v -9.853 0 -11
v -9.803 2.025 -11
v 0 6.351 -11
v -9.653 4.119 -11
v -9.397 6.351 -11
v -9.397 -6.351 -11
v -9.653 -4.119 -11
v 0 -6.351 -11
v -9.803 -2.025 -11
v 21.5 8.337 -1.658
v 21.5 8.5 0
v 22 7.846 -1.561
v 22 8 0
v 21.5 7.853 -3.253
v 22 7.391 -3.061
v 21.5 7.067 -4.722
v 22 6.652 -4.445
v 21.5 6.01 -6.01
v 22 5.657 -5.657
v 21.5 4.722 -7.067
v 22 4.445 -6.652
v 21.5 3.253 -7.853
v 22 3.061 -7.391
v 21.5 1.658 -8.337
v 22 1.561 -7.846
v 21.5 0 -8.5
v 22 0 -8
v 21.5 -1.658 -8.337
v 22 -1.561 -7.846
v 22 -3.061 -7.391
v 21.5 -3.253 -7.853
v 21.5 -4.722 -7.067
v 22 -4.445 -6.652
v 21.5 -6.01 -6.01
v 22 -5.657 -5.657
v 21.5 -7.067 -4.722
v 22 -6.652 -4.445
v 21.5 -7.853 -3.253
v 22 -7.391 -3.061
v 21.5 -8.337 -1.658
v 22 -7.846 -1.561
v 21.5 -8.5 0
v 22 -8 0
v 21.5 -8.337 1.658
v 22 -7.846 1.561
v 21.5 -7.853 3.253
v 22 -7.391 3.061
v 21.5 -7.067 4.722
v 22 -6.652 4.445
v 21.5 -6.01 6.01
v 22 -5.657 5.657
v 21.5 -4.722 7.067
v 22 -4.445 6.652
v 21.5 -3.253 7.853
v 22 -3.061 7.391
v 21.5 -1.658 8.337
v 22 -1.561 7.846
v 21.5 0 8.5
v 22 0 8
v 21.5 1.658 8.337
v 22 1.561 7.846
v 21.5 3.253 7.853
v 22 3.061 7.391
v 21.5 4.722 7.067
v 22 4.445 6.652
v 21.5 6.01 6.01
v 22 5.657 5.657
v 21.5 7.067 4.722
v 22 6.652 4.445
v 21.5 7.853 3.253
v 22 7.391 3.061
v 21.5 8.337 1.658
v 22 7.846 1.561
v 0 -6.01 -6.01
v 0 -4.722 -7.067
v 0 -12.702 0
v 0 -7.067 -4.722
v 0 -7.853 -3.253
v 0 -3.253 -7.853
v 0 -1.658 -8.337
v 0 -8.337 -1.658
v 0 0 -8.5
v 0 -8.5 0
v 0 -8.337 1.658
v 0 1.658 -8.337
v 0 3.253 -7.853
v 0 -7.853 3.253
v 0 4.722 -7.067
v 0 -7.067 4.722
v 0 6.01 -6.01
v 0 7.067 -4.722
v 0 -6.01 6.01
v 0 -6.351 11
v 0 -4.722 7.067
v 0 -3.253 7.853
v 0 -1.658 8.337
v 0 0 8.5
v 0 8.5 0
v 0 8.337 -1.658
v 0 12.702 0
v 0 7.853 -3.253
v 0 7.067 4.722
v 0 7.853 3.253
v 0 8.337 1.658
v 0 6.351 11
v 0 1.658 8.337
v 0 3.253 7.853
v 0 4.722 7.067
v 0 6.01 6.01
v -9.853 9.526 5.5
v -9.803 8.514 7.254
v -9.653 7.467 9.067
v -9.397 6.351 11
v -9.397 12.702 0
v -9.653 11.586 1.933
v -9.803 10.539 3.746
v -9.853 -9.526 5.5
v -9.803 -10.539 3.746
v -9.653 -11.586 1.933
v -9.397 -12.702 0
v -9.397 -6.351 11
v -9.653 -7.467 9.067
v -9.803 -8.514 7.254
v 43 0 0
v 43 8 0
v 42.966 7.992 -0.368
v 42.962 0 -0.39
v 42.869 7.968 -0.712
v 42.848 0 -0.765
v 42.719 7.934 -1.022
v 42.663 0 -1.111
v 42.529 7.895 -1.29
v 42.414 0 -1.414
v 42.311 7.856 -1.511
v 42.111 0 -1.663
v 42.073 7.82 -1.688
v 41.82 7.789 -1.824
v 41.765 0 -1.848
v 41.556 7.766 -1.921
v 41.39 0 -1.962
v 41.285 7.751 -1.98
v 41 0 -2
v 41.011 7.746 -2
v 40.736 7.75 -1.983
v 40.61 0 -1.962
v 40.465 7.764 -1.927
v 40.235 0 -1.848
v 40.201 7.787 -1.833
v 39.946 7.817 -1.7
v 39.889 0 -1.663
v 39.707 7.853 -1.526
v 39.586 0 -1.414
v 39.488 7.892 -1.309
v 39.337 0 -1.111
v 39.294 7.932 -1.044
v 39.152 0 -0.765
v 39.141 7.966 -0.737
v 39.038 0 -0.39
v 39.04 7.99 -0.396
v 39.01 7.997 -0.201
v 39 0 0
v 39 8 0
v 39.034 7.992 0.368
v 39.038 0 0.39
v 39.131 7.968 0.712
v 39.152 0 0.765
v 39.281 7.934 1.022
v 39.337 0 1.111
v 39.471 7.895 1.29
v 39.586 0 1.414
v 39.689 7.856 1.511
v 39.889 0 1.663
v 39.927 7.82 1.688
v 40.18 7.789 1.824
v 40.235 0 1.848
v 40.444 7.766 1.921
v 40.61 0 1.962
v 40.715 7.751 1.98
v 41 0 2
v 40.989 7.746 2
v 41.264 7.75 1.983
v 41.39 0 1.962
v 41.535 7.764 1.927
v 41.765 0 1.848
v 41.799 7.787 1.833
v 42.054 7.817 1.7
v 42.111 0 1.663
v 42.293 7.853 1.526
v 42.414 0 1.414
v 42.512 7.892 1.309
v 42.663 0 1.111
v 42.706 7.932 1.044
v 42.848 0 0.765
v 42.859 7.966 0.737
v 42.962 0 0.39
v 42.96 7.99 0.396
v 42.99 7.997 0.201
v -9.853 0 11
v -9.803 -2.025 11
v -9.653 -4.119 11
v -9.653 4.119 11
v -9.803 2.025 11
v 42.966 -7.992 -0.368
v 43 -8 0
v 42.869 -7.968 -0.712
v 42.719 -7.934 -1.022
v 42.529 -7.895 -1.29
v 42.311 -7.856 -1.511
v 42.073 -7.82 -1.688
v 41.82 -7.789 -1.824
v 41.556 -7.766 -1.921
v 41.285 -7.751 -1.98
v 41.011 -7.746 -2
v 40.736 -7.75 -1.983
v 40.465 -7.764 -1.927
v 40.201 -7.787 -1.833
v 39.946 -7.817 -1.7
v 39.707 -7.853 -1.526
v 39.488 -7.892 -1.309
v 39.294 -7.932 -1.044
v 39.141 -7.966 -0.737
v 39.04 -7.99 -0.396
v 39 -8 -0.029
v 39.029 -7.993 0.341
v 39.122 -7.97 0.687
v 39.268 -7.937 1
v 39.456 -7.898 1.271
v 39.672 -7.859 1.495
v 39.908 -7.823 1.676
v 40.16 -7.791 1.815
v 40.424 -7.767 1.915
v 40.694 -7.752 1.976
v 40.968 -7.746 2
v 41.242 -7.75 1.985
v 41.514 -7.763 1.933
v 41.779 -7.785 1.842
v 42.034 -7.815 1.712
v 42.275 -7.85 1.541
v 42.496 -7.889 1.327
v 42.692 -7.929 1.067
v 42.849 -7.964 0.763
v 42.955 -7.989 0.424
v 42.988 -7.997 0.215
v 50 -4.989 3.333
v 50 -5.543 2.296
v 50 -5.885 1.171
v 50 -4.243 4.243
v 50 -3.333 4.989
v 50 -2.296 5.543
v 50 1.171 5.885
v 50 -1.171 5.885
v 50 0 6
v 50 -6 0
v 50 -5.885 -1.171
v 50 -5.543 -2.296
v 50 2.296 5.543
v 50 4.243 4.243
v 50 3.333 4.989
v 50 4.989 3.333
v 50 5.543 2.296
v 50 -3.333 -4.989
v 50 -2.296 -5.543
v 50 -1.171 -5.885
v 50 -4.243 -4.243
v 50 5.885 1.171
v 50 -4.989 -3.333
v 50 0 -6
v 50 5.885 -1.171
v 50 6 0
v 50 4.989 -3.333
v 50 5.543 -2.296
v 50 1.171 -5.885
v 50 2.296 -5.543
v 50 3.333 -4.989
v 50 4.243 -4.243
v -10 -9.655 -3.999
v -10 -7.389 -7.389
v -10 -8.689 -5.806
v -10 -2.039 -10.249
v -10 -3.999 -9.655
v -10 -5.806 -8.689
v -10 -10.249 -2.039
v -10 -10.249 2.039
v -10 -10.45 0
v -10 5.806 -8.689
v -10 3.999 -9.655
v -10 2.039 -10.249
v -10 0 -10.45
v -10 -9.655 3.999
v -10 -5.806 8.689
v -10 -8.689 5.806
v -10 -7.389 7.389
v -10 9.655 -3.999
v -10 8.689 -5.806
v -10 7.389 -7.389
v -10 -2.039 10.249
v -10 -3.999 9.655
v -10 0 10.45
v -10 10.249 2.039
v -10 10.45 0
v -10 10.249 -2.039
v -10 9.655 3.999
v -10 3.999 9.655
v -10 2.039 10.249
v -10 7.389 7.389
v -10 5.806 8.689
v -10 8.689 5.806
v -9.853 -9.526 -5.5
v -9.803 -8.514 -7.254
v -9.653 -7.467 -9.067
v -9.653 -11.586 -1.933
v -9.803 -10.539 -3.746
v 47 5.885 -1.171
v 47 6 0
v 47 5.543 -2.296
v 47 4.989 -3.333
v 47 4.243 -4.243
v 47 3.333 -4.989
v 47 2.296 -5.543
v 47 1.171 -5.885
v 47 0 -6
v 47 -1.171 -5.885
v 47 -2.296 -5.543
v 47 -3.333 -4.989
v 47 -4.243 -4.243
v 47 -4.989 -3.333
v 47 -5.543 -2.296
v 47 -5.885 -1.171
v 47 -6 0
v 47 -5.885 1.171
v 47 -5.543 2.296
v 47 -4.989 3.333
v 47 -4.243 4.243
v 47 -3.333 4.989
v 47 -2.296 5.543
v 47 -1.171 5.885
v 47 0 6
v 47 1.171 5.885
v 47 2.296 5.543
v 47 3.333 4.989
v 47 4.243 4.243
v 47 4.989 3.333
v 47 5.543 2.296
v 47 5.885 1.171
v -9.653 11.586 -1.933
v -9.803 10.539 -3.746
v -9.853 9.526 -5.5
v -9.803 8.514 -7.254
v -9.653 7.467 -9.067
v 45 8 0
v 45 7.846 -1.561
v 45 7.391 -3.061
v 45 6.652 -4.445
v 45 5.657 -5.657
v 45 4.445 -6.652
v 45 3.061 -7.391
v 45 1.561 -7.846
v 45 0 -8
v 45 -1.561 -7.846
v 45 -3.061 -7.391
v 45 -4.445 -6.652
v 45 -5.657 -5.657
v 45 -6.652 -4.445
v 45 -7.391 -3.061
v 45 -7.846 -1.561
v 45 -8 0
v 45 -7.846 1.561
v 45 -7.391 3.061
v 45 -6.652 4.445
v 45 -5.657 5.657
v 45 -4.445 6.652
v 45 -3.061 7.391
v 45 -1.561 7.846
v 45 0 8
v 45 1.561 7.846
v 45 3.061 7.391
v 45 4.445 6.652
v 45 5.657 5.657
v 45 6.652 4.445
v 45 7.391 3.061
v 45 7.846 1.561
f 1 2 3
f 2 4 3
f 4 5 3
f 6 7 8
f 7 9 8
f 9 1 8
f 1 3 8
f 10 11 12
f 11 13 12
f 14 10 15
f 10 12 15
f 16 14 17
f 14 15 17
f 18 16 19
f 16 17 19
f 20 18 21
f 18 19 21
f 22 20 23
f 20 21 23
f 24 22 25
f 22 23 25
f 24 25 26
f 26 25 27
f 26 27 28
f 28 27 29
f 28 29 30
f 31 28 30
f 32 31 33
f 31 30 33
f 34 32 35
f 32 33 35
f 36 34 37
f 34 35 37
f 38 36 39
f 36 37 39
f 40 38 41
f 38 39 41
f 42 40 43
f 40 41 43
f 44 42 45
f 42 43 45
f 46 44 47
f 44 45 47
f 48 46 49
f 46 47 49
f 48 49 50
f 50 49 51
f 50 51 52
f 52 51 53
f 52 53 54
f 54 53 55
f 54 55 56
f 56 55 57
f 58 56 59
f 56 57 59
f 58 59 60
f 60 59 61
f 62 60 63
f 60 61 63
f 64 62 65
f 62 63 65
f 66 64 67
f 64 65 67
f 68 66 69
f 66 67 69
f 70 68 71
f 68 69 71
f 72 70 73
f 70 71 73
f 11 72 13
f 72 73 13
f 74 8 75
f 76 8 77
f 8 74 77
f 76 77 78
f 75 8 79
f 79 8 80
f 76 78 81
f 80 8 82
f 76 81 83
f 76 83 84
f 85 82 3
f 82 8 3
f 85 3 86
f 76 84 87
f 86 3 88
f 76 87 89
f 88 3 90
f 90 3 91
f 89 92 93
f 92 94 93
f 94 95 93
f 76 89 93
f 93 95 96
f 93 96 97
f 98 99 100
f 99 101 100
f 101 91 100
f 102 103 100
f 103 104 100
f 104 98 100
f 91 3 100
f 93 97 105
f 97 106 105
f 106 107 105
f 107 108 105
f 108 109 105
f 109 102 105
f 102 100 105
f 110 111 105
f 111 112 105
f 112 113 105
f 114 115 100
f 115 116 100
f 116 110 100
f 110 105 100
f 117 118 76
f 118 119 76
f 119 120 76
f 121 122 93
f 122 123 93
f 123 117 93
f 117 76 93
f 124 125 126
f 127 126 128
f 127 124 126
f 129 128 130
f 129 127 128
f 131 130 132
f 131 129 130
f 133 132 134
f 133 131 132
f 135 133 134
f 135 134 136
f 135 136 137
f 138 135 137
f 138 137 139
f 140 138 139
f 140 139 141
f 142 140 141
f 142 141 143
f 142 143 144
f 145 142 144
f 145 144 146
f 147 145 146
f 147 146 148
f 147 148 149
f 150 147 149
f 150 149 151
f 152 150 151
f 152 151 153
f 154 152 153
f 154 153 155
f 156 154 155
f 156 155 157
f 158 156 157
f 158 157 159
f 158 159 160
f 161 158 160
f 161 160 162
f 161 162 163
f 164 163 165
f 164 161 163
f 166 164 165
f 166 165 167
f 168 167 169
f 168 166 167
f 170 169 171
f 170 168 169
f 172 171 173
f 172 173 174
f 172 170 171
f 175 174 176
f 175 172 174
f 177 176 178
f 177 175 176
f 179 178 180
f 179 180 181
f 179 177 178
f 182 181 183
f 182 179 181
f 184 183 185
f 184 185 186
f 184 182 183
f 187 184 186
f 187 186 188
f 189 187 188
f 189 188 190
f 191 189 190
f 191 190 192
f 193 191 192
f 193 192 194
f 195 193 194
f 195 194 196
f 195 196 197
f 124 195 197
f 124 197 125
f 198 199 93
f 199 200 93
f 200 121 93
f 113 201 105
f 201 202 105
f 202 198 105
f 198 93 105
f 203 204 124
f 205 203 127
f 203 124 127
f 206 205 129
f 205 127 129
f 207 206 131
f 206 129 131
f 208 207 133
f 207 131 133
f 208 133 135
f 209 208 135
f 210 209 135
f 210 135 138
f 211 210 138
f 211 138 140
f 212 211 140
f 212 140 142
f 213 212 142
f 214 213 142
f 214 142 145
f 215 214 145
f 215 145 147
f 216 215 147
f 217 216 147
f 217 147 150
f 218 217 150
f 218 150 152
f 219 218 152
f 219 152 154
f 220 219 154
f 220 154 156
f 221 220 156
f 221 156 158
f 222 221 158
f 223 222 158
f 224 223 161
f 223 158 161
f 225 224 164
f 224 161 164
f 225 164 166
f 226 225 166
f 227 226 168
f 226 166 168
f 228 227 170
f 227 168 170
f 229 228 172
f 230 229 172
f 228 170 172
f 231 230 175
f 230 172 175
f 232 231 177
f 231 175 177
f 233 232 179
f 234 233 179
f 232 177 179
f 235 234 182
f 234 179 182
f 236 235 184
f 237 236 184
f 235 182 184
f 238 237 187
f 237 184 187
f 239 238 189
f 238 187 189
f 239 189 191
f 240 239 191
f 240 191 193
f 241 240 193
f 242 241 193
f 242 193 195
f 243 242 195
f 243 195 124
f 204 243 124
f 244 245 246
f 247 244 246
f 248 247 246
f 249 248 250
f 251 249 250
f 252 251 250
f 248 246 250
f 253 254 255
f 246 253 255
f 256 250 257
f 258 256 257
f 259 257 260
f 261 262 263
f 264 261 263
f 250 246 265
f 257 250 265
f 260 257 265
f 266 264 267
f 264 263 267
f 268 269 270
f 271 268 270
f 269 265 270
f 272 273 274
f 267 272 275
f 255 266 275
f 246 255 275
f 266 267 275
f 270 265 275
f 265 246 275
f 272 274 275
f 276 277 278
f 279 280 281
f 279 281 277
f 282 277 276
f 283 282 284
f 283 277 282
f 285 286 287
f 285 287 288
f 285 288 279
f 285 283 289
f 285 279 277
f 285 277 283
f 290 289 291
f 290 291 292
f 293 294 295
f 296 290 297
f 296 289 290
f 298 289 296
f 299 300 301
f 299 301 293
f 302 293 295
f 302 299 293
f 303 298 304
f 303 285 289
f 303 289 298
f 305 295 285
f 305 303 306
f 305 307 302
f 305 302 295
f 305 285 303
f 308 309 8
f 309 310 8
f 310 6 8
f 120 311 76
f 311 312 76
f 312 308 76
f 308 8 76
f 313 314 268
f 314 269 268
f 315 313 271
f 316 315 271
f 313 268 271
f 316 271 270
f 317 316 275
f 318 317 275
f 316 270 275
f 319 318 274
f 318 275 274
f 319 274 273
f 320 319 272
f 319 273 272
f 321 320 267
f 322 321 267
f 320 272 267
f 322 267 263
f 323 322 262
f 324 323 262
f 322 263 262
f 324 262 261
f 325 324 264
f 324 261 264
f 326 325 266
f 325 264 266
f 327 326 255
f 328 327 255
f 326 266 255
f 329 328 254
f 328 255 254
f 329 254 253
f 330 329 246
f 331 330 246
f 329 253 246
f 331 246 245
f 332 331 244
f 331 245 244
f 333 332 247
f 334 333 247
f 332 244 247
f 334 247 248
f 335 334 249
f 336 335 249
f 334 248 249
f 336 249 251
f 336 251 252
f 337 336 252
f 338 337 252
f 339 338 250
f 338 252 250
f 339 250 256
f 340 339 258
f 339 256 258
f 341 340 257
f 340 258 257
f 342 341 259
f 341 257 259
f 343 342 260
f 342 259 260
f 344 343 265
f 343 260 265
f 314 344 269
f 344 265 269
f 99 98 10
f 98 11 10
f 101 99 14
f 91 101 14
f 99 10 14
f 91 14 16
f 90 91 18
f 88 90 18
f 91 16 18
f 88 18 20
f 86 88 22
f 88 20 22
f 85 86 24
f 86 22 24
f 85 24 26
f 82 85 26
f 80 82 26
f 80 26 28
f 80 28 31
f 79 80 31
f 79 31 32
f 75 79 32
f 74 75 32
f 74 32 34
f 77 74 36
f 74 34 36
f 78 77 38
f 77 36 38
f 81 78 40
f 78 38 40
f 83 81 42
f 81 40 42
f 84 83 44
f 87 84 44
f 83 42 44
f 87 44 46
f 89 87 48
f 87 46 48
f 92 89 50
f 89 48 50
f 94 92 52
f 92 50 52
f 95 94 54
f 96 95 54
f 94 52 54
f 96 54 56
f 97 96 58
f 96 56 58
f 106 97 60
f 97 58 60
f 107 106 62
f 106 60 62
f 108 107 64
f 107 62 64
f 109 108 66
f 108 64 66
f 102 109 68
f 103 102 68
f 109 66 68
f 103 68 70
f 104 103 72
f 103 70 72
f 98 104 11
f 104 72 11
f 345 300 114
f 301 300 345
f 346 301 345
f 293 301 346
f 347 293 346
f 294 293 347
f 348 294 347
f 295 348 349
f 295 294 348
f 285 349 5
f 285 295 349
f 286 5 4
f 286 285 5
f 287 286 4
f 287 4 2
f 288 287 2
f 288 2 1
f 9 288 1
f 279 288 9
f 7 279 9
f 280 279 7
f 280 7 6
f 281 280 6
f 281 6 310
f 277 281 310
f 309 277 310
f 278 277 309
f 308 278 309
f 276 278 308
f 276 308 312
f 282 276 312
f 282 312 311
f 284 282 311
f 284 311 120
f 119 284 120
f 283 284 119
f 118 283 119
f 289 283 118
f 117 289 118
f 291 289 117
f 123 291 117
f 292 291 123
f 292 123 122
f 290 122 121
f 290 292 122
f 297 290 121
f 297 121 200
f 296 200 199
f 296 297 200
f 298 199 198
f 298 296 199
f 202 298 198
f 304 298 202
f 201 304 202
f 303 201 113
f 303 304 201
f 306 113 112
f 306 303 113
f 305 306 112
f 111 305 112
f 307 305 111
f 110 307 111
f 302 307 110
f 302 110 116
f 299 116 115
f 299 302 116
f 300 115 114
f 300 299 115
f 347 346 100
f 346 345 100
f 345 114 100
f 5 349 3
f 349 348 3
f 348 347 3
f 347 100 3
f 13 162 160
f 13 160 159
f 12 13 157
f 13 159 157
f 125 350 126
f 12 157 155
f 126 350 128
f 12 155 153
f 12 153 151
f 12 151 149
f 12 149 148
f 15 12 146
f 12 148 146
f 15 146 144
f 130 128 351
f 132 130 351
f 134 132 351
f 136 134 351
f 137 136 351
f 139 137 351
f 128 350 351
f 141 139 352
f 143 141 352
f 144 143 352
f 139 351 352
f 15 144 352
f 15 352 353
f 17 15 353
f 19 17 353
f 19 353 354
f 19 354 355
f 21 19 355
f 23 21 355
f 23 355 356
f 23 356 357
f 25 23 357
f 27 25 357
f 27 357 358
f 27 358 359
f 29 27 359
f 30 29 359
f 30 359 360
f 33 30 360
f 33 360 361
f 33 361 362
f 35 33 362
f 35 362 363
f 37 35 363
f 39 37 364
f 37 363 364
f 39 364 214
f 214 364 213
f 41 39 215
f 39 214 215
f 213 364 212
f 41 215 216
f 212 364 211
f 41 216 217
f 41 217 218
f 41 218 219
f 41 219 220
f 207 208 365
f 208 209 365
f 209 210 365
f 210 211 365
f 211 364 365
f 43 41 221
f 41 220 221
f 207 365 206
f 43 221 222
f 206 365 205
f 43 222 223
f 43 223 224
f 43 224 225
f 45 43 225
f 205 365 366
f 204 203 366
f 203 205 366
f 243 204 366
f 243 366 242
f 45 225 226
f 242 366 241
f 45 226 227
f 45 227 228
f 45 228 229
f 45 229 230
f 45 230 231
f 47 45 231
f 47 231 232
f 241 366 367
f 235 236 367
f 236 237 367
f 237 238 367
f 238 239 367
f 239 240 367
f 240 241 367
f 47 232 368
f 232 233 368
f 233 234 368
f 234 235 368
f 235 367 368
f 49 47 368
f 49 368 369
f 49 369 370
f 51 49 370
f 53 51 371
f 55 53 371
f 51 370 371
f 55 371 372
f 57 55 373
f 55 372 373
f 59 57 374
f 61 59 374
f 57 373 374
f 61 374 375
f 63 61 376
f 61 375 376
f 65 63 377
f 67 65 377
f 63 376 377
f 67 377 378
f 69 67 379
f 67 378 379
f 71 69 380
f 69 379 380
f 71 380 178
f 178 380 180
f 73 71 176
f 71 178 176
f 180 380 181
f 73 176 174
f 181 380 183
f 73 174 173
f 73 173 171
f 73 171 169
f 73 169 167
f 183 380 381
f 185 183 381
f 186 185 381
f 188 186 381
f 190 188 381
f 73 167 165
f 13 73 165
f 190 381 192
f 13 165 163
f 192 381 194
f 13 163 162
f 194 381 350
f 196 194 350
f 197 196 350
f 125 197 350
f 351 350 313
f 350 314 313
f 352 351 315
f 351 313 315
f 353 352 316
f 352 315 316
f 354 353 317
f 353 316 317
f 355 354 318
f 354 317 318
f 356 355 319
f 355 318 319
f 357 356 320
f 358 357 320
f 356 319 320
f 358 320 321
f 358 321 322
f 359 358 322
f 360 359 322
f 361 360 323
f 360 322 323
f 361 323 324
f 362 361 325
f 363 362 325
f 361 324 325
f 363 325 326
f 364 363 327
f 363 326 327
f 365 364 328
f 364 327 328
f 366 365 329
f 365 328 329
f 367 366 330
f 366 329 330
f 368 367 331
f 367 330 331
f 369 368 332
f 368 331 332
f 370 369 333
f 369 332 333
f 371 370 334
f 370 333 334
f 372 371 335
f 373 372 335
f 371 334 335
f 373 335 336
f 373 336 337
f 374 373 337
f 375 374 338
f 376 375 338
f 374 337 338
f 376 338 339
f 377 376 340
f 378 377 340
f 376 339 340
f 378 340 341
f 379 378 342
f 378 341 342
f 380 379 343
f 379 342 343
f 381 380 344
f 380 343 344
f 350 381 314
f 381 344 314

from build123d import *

# Parameters (mm, degrees)
BASEHEAD_DEPTH  = 10
SKE2_R          = 2
HOLE_DEPTH      = 13.701705922
HOLE_DEPTH_BACK = 13.701705922


with BuildPart() as part:
    # BodySke → BaseBody (revolve)
    with BuildSketch(Plane.XY):
        Polygon((0, 0), (0, 8.5), (21.5, 8.5), (22, 8), (45, 8), (47, 6), (50, 6), (50, 0), align=None)
    revolve(axis=Axis((0, 0, 0), (-1, 0, 0)))

    # Ske → BaseHead (add)
    with BuildSketch(Plane.ZY):
        Polygon((0, 12.701705922), (-11, 6.350852961), (-11, -6.350852961), (0, -12.701705922), (11, -6.350852961), (11, 6.350852961), align=None)
    extrude(amount=BASEHEAD_DEPTH)

    # Ske1 → HeadFillet (revolve, cut)
    with BuildSketch(Plane.XY):
        Polygon((-10, 12.701705922), (-9.396657217, 12.701705922), (-10, 10.45), align=None)
    revolve(axis=Axis((0, 0, 0), (-1, 0, 0)), mode=Mode.SUBTRACT)

    # Ske2 → Hole (cut, two sides)
    with BuildSketch(Plane(origin=(0, 0, 0), x_dir=(1, 0, 0), z_dir=(0, 1, 0))) as hole_sk:
        with Locations((41, 0)):
            Circle(SKE2_R)
    extrude(amount=HOLE_DEPTH, mode=Mode.SUBTRACT)
    extrude(hole_sk.sketch, amount=-HOLE_DEPTH_BACK, mode=Mode.SUBTRACT)


solid = part.part
